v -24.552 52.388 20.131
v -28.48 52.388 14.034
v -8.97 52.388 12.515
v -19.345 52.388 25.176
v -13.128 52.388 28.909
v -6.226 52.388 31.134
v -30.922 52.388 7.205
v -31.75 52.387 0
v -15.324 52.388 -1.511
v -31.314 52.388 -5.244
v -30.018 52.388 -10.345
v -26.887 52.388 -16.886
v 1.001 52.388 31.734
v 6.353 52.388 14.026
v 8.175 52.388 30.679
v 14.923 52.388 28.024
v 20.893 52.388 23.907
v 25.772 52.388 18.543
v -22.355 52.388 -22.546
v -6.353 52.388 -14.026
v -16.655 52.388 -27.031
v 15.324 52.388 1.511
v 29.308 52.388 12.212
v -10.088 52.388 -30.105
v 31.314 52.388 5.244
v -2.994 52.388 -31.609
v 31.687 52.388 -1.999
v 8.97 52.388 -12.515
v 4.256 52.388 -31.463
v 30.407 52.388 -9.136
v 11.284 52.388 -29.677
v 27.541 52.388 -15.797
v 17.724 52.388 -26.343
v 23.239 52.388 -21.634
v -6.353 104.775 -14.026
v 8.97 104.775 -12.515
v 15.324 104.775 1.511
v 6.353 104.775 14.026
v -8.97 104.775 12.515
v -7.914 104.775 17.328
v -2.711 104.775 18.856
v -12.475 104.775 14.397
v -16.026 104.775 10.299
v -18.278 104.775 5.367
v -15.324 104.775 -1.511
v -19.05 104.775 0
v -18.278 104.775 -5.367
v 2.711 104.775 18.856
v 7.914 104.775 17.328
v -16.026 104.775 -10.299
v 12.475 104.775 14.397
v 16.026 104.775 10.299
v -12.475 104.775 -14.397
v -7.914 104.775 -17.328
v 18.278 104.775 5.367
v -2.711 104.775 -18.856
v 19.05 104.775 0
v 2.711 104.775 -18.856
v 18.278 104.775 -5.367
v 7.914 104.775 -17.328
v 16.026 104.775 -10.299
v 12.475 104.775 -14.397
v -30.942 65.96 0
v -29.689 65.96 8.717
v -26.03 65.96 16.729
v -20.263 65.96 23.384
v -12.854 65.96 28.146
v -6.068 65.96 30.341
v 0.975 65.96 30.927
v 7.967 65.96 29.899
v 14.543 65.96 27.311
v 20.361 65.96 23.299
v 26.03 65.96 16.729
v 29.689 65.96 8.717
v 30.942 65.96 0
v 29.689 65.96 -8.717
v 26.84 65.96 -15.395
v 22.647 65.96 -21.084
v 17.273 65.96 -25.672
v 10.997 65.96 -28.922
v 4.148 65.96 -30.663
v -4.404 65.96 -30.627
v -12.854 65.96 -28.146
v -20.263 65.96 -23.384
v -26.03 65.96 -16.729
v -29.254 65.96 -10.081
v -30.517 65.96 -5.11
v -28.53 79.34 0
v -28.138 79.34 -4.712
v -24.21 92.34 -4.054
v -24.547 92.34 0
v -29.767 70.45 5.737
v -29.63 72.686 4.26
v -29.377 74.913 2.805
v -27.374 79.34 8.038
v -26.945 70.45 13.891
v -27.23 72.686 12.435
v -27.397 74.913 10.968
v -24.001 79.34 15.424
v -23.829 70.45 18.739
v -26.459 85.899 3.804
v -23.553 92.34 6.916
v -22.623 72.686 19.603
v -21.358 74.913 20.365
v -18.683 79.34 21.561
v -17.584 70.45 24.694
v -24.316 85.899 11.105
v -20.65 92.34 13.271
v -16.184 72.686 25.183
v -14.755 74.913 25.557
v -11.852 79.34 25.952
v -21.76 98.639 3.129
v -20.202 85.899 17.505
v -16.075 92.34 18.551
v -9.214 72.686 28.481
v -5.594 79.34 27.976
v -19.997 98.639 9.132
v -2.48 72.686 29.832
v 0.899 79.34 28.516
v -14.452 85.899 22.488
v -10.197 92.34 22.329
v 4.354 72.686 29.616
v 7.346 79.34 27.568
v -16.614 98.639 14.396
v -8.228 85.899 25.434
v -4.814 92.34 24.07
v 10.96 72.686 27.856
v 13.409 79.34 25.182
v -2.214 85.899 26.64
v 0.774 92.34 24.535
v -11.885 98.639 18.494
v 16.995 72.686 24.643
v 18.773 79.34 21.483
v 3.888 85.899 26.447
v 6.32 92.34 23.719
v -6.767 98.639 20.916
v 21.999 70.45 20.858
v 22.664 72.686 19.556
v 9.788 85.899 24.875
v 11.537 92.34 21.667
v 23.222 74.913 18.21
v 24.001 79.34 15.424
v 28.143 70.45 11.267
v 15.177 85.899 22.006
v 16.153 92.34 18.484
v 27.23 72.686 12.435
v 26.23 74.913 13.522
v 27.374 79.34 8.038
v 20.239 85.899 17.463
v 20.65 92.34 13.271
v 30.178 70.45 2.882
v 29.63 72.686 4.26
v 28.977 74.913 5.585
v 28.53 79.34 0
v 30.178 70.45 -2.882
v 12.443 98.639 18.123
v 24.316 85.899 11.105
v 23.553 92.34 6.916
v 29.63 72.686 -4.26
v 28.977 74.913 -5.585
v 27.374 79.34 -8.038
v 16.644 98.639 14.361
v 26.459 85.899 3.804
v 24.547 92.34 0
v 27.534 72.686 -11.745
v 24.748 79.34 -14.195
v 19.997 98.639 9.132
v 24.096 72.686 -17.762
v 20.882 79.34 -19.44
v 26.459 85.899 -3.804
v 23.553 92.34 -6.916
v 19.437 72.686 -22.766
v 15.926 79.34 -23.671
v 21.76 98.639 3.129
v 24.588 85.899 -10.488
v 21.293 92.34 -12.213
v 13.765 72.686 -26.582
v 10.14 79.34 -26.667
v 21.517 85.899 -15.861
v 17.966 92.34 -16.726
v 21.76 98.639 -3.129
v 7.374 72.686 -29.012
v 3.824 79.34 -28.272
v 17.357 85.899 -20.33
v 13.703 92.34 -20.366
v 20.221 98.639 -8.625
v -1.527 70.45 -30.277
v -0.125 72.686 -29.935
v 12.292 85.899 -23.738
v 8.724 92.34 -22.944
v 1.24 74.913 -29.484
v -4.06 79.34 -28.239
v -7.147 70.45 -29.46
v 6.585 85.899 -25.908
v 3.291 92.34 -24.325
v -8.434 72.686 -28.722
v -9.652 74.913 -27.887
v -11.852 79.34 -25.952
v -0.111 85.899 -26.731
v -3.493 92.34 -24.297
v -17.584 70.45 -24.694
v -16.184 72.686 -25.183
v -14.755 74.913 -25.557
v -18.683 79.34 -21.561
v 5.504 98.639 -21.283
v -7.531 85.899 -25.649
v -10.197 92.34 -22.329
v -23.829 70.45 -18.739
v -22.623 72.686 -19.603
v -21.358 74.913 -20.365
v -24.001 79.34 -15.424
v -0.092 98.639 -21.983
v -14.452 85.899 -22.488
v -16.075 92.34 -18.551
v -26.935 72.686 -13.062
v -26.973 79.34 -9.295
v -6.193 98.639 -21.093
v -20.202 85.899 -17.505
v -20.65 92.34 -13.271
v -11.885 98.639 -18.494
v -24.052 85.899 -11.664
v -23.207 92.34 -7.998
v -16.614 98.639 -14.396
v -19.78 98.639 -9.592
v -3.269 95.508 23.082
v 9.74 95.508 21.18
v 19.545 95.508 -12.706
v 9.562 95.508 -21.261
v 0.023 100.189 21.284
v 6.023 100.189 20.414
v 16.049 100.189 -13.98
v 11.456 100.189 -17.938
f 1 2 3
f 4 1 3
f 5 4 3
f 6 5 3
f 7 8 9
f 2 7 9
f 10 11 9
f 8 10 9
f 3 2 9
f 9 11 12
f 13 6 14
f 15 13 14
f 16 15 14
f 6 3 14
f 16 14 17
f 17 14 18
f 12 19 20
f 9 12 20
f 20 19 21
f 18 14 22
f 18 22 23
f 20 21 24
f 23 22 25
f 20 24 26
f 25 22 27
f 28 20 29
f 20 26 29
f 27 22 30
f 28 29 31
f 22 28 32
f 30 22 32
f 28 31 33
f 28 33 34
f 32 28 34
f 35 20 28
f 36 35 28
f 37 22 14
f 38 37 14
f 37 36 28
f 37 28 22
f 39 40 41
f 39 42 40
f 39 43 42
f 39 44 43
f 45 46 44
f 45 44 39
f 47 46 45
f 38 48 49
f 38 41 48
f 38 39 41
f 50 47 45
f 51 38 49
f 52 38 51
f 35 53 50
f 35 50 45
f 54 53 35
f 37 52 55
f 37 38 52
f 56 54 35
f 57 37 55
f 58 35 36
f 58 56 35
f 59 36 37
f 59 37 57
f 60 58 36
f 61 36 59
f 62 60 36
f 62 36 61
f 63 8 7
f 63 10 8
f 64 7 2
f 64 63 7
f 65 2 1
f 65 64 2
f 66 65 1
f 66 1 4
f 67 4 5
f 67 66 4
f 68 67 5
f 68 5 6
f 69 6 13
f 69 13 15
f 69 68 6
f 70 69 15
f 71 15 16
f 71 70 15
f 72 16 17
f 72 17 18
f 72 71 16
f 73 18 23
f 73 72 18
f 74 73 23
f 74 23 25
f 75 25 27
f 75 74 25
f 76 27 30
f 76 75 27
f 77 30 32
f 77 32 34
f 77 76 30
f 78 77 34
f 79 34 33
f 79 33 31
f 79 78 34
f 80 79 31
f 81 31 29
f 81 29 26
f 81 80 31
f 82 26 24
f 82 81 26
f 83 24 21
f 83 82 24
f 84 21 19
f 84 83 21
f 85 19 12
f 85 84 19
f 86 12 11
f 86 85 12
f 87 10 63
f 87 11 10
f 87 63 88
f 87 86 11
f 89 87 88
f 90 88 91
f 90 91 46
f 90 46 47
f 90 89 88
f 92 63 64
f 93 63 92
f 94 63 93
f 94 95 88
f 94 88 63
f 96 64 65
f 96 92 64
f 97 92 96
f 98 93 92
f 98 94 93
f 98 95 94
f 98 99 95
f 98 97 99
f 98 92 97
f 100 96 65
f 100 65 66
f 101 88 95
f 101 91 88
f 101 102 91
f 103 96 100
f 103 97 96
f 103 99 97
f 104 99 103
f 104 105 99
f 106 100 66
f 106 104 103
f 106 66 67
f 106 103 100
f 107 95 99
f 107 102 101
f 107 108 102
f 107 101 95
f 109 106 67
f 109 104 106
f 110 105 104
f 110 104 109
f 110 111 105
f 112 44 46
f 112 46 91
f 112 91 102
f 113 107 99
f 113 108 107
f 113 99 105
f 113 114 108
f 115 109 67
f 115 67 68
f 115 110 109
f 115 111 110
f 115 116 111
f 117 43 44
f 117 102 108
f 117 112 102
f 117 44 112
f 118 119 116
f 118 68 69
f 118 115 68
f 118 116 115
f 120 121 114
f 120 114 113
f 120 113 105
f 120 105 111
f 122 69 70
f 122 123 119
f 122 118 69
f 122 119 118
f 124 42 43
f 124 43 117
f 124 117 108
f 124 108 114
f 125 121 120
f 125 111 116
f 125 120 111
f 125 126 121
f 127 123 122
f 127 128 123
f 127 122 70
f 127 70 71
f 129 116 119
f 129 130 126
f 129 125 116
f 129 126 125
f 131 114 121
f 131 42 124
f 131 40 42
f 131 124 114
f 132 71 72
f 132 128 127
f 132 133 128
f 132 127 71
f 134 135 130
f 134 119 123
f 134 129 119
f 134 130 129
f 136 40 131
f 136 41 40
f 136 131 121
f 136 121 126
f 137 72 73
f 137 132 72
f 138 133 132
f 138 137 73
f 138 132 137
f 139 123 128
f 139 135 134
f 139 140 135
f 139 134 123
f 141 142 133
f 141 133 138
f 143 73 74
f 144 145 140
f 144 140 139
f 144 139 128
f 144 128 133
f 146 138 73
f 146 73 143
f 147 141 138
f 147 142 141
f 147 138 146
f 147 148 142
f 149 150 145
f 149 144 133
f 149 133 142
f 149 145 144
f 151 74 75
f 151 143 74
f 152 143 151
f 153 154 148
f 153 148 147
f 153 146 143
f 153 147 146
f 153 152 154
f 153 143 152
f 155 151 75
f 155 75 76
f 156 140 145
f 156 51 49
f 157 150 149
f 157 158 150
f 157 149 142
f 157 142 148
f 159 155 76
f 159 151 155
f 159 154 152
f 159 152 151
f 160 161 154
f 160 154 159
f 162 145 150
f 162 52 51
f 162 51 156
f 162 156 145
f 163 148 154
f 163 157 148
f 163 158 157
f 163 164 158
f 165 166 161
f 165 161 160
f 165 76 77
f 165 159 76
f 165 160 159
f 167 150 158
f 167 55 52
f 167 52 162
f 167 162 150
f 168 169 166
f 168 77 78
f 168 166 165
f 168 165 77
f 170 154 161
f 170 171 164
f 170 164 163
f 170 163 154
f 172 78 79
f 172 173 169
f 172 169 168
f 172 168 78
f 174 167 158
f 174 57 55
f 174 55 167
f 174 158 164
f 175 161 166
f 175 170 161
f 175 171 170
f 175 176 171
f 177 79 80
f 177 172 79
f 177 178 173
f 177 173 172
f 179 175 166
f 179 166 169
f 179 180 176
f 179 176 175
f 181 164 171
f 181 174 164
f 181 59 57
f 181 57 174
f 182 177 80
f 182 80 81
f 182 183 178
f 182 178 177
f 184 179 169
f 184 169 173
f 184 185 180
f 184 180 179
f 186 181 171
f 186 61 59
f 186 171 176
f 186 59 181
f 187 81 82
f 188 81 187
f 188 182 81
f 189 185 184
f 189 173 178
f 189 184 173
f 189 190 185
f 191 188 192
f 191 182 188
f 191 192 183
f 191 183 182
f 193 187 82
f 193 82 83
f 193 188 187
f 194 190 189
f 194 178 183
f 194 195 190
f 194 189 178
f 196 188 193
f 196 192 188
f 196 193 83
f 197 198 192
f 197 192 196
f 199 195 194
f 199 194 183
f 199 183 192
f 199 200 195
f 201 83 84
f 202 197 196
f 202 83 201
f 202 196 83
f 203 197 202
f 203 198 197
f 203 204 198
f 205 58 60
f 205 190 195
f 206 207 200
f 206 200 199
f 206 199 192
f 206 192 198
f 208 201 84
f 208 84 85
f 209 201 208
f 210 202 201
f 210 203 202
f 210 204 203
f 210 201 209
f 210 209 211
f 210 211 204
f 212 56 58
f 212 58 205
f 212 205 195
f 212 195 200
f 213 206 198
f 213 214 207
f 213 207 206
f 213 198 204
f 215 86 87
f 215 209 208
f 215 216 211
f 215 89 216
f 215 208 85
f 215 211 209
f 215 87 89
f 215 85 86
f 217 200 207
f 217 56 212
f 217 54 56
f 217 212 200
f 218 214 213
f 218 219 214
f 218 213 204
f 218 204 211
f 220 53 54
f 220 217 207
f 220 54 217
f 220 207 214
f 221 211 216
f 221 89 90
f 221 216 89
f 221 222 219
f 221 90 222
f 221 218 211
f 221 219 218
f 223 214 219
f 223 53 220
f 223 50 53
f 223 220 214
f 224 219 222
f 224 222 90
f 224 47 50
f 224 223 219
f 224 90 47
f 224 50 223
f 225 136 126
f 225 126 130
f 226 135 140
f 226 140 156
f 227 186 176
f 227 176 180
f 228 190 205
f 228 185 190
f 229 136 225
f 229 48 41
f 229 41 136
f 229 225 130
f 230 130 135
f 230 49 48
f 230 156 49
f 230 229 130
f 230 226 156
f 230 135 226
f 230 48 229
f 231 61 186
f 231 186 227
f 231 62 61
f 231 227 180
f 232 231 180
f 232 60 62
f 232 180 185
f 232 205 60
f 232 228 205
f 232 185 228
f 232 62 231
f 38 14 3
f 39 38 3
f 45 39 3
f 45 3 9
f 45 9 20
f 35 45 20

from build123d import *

# Parameters (mm, degrees)
SKETCH1_R               = 19.05
BOSS_EXTRUDE1_DEPTH     = 104.775
CUT_EXTRUDE1_DEPTH      = 104.775
SKETCH5_W               = 79.059329342
SKETCH5_H               = 52.3875
CUT_EXTRUDE2_DEPTH      = 32.7500001
CUT_EXTRUDE2_DEPTH_BACK = 32.7500001


with BuildPart() as part:
    # Sketch1 → Boss-Extrude1 (new body)
    with BuildSketch(Plane(origin=(0, 0, 0), x_dir=(1, 0, 0), z_dir=(0, 1, 0))):
        Circle(SKETCH1_R)
    extrude(amount=BOSS_EXTRUDE1_DEPTH)

    # Sketch2 → Cut-Extrude1 (cut)
    with BuildSketch(Plane.XZ):
        Polygon((-15.323636661, -1.510781079), (-6.353443536, -14.026049167), (8.970193125, -12.515268087), (15.323636661, 1.510781079), (6.353443536, 14.026049167), (-8.970193125, 12.515268087), align=None)
    extrude(amount=-CUT_EXTRUDE1_DEPTH, mode=Mode.SUBTRACT)

    # Sketch4 → Revolve1 (revolve)
    with BuildSketch(Plane.XY):
        with BuildLine():
            Line((-19.05, 104.775), (-19.05, 0))
            ThreePointArc((-19.05, 0), (-31.75, 52.3875), (-19.05, 104.775))
        make_face()
    revolve(axis=Axis((0, 0, 0), (0, 1, 0)))

    # Sketch5 → Cut-Extrude2 (cut, two sides)
    with BuildSketch(Plane.XY) as cut_extrude2_sk:
        with Locations((-0.139680794, 26.19375)):
            Rectangle(SKETCH5_W, SKETCH5_H)
    extrude(amount=CUT_EXTRUDE2_DEPTH, mode=Mode.SUBTRACT)
    extrude(cut_extrude2_sk.sketch, amount=-CUT_EXTRUDE2_DEPTH_BACK, mode=Mode.SUBTRACT)


solid = part.part
